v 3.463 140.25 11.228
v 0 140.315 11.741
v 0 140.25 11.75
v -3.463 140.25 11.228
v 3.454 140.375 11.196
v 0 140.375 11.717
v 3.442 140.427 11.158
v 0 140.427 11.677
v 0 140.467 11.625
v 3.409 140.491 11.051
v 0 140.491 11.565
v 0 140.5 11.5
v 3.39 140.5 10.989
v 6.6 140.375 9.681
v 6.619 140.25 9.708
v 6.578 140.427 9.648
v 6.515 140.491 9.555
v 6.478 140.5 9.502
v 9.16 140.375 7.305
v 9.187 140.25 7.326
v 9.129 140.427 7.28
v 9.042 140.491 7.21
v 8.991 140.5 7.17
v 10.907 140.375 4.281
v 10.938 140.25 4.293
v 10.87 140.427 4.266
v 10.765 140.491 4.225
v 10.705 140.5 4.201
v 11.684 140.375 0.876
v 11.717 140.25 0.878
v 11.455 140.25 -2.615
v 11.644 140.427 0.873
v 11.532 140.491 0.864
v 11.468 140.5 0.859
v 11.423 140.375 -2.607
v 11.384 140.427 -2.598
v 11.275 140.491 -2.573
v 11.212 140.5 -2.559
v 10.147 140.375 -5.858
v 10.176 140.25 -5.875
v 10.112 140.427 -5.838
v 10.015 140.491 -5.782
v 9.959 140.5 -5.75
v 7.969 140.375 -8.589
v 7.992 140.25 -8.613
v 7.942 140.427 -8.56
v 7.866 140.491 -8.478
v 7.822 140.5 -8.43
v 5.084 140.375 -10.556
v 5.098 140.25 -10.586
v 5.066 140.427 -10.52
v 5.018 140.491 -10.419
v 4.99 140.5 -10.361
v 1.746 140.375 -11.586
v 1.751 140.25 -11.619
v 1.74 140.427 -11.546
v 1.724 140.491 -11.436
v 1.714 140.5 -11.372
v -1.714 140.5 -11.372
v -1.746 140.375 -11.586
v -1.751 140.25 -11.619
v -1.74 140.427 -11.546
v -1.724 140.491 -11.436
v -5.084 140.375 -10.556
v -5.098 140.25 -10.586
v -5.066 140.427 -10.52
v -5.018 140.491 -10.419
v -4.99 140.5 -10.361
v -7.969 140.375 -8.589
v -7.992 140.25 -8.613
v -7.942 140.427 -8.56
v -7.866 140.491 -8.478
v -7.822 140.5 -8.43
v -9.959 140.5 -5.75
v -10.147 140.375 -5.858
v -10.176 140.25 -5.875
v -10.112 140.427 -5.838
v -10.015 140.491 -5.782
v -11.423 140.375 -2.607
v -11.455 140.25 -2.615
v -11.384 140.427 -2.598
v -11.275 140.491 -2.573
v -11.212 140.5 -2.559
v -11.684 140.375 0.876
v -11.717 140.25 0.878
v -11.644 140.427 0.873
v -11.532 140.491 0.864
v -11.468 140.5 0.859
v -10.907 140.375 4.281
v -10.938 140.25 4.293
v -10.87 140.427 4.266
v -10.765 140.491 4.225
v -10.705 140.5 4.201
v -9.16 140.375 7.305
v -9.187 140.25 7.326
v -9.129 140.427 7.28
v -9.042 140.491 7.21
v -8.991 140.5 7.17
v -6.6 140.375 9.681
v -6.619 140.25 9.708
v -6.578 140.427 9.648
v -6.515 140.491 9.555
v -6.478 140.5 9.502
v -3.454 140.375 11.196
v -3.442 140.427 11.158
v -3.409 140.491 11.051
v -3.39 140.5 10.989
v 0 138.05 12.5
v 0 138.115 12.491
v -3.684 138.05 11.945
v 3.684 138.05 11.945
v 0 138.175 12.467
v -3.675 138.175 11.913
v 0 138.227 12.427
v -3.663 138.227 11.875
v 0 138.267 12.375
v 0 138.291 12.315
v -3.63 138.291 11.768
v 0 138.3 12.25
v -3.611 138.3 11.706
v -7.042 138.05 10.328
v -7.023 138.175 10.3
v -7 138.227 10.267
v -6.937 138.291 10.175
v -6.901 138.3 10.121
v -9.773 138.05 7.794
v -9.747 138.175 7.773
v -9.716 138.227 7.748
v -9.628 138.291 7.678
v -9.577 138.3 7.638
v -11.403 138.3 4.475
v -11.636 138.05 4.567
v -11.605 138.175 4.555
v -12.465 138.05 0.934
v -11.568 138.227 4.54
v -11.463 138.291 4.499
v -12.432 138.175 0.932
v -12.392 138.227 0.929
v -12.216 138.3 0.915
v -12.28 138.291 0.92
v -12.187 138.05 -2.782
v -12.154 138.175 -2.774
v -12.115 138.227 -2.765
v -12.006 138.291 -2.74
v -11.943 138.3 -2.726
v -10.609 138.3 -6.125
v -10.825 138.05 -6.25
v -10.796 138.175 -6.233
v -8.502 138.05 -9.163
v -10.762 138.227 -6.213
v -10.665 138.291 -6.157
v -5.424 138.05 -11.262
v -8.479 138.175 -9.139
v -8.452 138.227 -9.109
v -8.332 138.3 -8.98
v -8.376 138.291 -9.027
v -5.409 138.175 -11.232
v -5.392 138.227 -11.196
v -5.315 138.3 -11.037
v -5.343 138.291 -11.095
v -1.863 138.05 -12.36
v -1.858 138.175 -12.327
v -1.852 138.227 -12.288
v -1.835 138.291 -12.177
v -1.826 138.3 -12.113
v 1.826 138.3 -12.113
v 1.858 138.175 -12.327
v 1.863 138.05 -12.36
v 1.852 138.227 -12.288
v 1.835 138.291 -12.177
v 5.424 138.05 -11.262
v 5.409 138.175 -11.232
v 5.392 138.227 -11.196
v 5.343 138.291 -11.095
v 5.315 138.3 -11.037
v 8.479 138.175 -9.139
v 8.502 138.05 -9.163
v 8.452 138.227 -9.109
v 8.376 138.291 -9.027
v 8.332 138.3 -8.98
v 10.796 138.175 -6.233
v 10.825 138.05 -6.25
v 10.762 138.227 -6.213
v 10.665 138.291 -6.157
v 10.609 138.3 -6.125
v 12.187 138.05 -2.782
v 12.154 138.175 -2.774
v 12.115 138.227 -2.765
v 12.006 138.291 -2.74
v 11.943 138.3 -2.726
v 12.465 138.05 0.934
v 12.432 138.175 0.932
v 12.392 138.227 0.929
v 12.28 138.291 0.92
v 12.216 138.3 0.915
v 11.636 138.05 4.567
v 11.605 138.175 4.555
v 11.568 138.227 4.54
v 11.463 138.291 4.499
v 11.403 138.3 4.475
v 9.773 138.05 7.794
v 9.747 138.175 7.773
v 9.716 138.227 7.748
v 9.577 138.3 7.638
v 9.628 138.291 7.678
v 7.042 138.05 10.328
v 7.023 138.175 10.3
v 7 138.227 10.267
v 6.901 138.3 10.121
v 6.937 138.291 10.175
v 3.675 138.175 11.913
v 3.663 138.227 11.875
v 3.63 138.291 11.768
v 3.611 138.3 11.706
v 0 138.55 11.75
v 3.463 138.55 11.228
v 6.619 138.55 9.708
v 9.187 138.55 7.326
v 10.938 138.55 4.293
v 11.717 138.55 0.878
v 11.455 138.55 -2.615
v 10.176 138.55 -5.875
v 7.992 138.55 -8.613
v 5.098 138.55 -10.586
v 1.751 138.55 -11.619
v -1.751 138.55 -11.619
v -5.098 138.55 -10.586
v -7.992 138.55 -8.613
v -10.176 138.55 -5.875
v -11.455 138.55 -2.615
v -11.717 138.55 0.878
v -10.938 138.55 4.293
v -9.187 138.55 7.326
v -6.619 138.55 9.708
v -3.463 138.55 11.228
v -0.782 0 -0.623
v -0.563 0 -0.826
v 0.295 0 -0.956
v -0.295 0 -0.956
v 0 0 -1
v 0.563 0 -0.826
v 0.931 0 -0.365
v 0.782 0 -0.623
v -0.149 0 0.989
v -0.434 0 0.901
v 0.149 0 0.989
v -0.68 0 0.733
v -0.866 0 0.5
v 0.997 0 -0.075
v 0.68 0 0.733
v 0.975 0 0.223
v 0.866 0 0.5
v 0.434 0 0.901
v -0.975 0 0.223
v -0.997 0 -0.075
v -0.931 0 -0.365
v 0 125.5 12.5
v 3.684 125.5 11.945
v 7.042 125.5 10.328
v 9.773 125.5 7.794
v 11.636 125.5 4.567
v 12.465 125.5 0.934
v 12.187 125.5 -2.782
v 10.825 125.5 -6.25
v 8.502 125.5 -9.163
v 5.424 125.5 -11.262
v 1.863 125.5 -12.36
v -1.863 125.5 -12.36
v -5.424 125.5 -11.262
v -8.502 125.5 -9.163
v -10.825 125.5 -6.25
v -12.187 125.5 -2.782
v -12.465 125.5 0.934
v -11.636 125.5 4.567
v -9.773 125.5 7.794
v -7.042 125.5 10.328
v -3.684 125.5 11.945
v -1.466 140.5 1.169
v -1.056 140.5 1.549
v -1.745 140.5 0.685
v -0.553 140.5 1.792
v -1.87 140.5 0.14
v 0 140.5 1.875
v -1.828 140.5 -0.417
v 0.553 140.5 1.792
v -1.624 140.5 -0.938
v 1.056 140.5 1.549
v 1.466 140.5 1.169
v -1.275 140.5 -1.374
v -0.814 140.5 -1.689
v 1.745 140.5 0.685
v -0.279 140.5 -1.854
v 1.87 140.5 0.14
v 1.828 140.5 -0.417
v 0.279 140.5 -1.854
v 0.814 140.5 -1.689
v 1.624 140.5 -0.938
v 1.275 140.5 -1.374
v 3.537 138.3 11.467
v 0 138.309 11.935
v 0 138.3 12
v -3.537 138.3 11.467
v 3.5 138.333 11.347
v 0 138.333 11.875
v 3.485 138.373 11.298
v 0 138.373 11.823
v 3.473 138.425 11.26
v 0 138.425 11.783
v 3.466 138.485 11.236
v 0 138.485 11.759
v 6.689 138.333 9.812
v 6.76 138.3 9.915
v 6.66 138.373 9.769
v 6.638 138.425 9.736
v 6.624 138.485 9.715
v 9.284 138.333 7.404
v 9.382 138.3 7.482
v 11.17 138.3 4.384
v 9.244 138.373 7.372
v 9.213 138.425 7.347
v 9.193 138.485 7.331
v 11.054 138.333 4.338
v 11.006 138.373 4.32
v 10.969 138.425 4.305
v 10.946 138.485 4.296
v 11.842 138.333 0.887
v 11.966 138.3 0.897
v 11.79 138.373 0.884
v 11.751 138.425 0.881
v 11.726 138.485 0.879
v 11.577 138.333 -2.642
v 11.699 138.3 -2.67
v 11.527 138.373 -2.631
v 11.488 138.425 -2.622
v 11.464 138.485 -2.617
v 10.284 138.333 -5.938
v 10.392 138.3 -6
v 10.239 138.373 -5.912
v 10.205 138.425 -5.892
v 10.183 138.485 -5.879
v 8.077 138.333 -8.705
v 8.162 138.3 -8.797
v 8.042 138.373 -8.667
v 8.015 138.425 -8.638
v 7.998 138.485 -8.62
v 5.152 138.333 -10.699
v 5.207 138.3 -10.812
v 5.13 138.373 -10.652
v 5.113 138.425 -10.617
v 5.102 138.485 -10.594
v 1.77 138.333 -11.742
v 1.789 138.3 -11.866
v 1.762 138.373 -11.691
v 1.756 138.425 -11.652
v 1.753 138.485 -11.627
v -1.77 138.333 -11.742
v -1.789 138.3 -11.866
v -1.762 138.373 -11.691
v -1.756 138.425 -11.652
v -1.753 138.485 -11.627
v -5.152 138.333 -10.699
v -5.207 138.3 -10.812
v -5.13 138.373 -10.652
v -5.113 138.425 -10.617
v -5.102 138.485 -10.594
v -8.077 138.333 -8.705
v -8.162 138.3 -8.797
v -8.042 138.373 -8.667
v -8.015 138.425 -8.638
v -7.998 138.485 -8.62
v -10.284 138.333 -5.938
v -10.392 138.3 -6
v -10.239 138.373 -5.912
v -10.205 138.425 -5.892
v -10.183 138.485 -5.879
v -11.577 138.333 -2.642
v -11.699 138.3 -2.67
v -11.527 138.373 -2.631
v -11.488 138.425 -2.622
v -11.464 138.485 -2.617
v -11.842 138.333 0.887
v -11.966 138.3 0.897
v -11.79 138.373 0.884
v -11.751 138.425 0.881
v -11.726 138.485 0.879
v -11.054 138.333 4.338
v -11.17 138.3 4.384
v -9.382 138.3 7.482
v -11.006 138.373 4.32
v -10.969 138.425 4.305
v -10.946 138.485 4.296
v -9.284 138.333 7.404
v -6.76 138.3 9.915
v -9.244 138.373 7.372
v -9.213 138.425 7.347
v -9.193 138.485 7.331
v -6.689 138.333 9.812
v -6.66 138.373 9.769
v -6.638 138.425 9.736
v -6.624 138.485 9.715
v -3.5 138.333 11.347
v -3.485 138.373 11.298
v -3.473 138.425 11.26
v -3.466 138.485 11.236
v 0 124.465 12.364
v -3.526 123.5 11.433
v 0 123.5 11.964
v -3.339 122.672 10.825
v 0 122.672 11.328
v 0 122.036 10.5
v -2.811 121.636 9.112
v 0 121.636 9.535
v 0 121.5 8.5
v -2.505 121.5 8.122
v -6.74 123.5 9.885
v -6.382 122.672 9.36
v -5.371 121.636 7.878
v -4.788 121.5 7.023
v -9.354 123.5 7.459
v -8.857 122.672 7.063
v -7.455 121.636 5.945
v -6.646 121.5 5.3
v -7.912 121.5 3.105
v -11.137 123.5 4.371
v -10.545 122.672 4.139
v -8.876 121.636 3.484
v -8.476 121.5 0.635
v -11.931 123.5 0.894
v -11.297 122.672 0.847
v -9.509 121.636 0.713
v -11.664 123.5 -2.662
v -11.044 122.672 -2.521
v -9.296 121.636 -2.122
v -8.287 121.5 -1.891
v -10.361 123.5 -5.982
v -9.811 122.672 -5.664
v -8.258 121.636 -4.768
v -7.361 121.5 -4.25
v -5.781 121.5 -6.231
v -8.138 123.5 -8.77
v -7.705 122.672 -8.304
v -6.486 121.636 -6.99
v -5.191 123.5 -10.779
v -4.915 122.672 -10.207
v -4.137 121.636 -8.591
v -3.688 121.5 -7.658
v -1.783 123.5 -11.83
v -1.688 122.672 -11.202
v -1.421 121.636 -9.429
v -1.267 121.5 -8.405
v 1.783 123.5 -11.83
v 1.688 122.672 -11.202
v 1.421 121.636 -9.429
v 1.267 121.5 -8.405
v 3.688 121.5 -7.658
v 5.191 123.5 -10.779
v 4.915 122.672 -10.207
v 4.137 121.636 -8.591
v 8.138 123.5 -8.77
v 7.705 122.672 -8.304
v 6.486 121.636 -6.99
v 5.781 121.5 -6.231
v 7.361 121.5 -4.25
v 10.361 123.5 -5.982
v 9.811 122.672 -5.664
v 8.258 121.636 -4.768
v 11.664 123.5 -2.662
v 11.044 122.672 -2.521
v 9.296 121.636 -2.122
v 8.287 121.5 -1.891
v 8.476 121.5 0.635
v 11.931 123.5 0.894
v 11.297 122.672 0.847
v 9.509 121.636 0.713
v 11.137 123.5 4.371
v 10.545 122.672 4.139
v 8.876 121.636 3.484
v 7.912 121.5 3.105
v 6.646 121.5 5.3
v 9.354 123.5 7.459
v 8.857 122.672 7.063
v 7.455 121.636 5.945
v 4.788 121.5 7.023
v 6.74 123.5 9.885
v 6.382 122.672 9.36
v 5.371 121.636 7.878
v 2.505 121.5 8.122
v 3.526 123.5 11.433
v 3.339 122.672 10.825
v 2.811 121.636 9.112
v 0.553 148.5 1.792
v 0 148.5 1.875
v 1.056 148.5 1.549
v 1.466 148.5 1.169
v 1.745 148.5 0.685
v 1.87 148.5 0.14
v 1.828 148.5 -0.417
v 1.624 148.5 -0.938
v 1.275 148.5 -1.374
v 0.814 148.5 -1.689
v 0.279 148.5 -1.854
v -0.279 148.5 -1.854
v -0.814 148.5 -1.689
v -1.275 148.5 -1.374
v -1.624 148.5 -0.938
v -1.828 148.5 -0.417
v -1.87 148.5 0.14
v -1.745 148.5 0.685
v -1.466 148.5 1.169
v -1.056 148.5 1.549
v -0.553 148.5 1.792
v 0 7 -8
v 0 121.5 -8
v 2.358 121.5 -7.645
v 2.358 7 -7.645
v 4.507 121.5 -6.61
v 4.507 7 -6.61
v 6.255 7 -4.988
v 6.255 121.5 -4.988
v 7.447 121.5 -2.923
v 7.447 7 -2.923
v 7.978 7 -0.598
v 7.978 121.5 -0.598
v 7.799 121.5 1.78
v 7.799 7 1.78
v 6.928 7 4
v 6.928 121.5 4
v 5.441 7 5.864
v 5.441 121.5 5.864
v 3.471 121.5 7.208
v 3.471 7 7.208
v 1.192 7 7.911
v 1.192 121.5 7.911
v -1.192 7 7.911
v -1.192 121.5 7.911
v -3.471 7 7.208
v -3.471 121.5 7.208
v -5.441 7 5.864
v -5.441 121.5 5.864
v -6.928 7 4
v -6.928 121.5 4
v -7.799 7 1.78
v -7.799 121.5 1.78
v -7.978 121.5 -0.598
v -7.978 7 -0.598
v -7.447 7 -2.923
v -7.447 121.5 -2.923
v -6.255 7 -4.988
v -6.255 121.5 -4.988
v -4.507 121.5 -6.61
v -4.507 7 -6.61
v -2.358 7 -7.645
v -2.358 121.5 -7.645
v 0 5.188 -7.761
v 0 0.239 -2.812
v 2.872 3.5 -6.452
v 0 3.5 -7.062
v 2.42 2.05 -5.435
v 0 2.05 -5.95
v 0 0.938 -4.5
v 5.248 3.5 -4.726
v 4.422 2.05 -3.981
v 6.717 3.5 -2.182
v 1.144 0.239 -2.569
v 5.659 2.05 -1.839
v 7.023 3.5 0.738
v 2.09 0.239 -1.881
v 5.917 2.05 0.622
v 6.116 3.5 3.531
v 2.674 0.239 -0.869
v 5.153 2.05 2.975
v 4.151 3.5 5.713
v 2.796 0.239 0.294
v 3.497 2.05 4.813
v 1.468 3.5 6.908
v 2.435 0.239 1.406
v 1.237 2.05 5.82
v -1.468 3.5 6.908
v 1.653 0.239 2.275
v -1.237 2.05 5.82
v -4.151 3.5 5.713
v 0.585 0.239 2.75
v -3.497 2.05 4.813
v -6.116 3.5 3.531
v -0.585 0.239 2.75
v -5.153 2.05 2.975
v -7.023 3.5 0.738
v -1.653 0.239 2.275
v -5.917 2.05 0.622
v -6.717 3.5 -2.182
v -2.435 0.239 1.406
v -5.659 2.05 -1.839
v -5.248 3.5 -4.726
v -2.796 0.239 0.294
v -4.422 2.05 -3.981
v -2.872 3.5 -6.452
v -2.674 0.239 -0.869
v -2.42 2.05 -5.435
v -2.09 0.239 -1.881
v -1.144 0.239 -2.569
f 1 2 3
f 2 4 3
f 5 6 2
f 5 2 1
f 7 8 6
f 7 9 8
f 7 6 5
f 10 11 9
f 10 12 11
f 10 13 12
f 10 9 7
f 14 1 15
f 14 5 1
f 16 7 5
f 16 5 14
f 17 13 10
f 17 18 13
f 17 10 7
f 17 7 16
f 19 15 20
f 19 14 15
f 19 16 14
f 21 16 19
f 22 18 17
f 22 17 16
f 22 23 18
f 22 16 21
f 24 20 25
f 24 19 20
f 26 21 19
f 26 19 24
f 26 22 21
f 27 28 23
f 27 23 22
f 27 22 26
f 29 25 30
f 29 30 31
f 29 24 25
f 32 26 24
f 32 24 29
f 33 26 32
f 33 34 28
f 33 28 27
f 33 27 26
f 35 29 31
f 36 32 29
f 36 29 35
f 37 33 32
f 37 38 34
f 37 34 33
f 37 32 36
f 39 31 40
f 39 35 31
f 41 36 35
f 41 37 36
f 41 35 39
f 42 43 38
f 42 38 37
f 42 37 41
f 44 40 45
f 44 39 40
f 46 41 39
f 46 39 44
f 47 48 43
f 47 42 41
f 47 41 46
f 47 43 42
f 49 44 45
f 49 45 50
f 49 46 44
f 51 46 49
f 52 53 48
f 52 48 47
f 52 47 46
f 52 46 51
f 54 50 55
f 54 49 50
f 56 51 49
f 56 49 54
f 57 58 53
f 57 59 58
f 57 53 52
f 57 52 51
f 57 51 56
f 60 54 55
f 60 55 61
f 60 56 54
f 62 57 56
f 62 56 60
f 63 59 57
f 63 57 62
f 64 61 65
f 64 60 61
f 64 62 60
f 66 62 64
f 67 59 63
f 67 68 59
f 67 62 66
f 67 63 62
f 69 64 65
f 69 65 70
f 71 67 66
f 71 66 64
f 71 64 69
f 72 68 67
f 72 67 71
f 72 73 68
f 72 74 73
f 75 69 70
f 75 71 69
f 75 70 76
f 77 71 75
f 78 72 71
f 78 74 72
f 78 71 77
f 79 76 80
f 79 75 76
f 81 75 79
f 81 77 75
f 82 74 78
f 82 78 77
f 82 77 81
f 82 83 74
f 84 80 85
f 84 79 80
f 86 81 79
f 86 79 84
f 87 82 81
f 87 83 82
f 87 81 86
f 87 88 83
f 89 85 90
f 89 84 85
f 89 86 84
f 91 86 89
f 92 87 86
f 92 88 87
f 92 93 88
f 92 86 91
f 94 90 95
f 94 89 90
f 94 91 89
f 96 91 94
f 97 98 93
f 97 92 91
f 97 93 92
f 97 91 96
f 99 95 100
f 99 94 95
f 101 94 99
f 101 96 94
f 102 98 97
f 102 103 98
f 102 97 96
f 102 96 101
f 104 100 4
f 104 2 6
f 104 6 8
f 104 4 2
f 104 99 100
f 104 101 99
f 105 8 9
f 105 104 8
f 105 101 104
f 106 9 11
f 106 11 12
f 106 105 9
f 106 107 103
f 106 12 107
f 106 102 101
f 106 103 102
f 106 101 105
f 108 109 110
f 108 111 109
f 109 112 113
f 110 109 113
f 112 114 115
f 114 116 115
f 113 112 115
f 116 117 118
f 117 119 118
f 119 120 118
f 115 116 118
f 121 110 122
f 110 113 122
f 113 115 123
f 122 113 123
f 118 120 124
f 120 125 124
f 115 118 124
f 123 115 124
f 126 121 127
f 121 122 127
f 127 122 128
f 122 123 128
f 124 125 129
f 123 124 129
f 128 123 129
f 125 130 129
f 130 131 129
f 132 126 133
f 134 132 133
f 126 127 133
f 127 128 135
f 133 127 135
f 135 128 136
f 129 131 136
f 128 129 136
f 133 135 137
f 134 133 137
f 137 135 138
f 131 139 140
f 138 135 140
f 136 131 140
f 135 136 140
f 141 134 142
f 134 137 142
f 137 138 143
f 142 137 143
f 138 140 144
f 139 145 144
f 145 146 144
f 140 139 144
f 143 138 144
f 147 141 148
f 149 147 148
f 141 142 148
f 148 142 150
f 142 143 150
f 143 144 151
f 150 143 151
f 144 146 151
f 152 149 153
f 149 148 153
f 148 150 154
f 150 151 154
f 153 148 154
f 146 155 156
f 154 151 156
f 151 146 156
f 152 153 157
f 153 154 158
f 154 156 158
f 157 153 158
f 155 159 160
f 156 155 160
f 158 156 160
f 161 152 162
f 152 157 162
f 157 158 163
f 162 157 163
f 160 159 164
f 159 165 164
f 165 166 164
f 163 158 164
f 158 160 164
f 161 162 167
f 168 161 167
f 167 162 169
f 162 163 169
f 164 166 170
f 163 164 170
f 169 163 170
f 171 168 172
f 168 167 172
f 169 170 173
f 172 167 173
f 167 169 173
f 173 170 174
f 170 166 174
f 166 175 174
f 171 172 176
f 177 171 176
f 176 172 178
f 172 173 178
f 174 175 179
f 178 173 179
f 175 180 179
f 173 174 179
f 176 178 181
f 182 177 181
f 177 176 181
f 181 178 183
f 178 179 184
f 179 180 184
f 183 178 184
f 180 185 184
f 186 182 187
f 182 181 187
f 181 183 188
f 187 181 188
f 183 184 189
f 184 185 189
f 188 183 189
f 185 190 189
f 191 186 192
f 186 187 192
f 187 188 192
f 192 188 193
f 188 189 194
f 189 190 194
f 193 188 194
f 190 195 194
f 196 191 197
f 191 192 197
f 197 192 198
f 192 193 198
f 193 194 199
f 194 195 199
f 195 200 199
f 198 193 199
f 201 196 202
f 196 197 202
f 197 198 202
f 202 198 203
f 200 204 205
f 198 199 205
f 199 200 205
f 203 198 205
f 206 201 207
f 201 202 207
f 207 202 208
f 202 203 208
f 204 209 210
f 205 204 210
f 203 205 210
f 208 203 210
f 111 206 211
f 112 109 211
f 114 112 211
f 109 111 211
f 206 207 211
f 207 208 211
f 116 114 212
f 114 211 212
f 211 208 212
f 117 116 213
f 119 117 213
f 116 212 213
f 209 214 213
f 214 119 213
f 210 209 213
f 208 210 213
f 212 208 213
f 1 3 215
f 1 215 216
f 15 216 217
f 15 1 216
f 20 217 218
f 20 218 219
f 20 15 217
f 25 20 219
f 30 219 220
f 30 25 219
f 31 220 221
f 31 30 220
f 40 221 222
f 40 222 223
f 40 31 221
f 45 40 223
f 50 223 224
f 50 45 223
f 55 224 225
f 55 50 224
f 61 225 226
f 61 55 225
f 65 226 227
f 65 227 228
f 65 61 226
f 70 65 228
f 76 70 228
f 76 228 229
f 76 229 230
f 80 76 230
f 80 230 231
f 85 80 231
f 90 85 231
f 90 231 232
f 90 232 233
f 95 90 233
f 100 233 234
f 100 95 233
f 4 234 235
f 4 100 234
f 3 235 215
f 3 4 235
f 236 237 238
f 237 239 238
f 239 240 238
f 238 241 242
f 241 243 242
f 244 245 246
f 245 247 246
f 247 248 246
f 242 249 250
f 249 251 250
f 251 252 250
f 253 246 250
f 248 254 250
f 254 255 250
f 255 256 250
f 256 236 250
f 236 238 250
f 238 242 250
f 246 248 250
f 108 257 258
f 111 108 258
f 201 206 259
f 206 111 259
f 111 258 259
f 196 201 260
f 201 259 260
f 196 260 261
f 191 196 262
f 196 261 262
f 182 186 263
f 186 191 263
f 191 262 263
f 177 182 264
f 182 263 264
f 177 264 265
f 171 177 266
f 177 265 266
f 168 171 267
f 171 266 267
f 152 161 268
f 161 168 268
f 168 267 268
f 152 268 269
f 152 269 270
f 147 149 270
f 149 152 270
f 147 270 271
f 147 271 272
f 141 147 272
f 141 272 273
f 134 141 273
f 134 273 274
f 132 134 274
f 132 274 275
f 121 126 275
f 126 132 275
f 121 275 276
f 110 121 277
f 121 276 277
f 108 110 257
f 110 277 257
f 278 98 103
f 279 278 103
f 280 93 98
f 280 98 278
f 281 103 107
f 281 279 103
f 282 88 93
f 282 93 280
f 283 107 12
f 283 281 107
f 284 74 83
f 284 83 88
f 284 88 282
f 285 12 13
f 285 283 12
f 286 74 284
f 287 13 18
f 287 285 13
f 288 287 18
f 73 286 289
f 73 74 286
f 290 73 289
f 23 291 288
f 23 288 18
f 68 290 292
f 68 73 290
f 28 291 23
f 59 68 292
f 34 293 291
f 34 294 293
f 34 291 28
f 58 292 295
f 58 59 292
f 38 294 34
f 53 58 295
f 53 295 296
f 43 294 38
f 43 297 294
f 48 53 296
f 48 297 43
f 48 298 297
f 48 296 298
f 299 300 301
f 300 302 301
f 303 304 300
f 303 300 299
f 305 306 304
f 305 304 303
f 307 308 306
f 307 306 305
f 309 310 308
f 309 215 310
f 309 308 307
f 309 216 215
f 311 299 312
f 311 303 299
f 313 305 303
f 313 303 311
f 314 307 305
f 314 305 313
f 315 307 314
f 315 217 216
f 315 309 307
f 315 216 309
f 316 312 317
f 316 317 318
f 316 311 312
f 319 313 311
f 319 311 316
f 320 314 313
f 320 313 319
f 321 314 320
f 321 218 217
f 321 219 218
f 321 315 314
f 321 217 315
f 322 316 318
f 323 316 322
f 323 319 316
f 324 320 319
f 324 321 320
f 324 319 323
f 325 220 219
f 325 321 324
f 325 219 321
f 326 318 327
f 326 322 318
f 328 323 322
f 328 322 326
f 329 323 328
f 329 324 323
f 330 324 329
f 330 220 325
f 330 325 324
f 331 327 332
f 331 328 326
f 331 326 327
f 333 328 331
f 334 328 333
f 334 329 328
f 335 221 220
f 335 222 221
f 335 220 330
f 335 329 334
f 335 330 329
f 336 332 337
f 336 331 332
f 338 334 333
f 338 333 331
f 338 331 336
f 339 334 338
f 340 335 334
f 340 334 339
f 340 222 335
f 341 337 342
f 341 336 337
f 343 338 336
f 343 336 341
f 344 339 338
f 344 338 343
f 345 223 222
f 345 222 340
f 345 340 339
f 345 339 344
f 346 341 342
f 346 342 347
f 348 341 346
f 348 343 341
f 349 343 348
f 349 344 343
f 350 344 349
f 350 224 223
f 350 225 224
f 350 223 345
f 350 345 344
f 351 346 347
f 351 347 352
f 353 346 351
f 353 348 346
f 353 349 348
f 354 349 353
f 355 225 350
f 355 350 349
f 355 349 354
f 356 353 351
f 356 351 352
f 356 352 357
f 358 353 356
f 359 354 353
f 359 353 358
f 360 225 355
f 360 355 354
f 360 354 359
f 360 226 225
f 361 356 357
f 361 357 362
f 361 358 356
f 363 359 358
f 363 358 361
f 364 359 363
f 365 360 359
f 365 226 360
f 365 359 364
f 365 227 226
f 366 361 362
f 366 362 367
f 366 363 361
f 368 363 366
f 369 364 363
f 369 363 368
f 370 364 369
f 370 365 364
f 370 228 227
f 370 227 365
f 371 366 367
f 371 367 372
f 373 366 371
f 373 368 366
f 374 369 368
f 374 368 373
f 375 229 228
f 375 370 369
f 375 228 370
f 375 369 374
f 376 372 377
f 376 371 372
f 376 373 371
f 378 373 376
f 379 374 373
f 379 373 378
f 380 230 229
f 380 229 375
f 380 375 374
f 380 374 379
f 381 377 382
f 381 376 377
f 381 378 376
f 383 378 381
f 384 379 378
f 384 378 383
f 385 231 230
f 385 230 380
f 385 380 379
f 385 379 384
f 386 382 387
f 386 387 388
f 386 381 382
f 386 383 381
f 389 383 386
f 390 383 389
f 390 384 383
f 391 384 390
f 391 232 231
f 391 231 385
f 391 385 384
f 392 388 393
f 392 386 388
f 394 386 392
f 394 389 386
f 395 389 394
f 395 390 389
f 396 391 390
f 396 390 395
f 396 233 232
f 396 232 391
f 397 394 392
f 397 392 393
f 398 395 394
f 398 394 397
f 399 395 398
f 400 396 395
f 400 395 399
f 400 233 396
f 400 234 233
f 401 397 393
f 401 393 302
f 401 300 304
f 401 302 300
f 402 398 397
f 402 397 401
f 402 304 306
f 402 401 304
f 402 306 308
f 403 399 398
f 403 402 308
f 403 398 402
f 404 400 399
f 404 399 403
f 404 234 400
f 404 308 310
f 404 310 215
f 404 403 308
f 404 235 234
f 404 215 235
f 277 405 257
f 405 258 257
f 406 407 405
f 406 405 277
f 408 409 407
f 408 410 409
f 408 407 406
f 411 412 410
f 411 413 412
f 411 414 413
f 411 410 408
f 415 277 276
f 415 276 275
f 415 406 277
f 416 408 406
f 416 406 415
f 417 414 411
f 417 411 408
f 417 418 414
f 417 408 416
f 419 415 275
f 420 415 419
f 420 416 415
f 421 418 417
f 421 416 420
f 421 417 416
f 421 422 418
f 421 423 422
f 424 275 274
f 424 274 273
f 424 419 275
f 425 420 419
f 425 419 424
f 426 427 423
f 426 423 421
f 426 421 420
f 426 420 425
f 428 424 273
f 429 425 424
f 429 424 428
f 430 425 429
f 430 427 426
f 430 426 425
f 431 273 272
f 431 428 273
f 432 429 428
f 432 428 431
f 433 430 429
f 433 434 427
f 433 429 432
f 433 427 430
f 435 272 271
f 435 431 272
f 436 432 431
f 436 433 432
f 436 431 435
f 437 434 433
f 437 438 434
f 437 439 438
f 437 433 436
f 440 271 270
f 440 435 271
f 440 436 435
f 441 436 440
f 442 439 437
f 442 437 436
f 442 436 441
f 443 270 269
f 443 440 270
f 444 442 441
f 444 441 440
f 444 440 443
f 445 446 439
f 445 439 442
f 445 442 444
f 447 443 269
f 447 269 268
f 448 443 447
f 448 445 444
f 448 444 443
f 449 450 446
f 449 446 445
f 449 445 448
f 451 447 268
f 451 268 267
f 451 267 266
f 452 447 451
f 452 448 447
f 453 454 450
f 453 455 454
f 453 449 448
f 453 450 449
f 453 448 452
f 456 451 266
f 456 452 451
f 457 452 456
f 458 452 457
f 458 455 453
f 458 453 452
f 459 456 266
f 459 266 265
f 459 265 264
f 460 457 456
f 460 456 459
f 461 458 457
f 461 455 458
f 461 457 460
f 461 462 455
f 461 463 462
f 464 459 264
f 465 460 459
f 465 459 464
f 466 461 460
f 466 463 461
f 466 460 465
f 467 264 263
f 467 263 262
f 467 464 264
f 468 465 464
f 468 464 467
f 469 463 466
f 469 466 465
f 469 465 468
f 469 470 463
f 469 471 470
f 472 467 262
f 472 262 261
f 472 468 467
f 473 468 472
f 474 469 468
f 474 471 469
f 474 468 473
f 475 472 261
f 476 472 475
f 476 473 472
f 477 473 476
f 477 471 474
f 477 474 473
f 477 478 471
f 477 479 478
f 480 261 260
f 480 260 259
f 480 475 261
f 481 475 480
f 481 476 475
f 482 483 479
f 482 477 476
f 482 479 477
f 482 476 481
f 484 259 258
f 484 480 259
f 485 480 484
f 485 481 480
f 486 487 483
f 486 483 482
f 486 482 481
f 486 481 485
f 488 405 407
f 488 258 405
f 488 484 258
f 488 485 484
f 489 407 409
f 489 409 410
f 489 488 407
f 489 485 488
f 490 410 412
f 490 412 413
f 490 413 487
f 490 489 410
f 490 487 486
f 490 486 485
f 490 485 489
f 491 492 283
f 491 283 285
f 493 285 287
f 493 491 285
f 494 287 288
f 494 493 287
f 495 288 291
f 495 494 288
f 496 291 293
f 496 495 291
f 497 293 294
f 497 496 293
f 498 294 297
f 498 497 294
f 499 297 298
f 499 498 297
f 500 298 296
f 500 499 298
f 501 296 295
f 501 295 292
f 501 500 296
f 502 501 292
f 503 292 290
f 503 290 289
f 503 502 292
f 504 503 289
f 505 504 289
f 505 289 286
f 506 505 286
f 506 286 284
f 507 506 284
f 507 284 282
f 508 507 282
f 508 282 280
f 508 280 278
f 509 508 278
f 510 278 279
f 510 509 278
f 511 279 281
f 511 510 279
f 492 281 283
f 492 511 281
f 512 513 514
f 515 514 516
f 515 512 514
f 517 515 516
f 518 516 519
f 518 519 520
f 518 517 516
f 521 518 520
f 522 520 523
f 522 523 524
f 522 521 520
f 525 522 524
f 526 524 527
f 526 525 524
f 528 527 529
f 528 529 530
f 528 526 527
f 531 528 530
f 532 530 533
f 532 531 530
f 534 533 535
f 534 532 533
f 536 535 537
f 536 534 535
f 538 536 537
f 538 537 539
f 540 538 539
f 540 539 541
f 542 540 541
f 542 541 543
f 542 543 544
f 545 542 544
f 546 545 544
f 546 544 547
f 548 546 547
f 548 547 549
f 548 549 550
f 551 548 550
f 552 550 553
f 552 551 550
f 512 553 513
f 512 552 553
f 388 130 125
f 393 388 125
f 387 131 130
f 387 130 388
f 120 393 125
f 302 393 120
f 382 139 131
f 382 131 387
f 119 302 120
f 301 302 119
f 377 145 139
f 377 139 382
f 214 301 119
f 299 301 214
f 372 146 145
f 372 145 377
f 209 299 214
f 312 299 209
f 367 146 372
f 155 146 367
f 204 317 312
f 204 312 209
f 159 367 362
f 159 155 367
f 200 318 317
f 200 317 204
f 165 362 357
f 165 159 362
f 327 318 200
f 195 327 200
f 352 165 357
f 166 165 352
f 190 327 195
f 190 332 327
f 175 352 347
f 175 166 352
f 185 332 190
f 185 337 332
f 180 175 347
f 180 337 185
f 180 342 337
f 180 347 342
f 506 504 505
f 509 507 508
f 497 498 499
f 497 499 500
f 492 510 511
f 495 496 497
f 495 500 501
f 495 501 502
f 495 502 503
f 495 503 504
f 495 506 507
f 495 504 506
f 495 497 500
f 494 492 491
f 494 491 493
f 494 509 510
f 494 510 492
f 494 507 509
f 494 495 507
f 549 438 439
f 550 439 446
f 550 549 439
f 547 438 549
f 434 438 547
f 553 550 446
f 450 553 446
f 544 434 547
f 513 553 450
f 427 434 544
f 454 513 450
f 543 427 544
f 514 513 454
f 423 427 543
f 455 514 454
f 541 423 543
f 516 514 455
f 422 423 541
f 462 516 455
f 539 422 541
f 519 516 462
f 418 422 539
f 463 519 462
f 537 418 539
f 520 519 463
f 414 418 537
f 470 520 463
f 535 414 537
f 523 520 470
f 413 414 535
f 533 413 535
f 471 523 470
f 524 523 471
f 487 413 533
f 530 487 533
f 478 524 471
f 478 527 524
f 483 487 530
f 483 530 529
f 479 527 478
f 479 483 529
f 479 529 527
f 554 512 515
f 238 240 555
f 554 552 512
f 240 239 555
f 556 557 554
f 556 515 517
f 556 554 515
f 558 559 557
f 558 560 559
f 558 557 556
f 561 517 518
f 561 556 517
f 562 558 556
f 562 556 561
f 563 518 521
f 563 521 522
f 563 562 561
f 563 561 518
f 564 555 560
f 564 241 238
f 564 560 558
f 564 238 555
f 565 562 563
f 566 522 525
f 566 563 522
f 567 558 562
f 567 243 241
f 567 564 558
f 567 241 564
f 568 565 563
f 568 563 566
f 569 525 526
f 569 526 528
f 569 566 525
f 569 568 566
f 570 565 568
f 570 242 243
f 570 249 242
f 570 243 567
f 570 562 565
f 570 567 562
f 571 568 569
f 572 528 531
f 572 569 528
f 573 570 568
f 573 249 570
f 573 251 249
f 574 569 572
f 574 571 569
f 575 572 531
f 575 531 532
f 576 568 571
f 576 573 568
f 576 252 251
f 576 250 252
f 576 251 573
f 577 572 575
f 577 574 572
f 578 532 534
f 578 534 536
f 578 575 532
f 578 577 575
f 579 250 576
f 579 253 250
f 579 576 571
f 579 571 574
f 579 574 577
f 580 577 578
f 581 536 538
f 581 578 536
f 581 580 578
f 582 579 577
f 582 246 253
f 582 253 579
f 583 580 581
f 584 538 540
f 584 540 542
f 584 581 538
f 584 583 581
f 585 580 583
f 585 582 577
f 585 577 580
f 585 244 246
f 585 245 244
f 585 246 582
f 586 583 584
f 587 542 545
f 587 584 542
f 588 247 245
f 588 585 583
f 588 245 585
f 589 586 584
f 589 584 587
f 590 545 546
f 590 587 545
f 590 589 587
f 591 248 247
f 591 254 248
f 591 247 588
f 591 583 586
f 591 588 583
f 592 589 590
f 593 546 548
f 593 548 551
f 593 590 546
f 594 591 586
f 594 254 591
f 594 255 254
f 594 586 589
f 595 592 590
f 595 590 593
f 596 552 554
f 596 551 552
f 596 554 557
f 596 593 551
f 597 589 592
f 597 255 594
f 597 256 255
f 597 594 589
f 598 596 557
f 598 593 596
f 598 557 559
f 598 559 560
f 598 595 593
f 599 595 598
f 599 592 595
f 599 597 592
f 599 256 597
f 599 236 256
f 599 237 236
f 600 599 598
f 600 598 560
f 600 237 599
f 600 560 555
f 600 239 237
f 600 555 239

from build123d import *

# Parameters (mm, degrees)
SKETCH1_R           = 12.5
BOSS_EXTRUDE1_DEPTH = 148.5
SKETCH2_OUTSIDE_W   = 57.53
SKETCH2_OUTSIDE_H   = 57.53
SKETCH2_OUTSIDE_R   = 8
CUT_EXTRUDE1_DEPTH  = 121.5
SKETCH3_OUTSIDE_W   = 57.53
SKETCH3_OUTSIDE_H   = 57.53
SKETCH3_OUTSIDE_R   = 1.875
CUT_EXTRUDE2_DEPTH  = 8
FILLET1_R           = 4
FILLET2_R           = 7
SKETCH6_OUTSIDE_W   = 57.53
SKETCH6_OUTSIDE_H   = 57.53
SKETCH6_OUTSIDE_R   = 11.75
CUT_EXTRUDE3_DEPTH  = 2.2
FILLET3_R           = 0.25


with BuildPart() as part:
    # Sketch1 → Boss-Extrude1 (new body)
    with BuildSketch(Plane(origin=(0, 0, 0), x_dir=(1, 0, 0), z_dir=(0, 1, 0))):
        with Locations(Location((0, 0, 0), (0, 0, 270))):
            Circle(SKETCH1_R)
    extrude(amount=BOSS_EXTRUDE1_DEPTH)

    # Sketch2 outside → Cut-Extrude1 (cut)
    with BuildSketch(Plane.XZ):
        Rectangle(SKETCH2_OUTSIDE_W, SKETCH2_OUTSIDE_H)
        with Locations(Location((0, 0, 0), (0, 0, 270))):
            Circle(SKETCH2_OUTSIDE_R, mode=Mode.SUBTRACT)
    extrude(amount=-CUT_EXTRUDE1_DEPTH, mode=Mode.SUBTRACT)

    # Sketch3 outside → Cut-Extrude2 (cut)
    with BuildSketch(Plane(origin=(0, 148.5, 0), x_dir=(1, 0, 0), z_dir=(0, 1, 0))):
        Rectangle(SKETCH3_OUTSIDE_W, SKETCH3_OUTSIDE_H)
        with Locations(Location((0, 0, 0), (0, 0, 270))):
            Circle(SKETCH3_OUTSIDE_R, mode=Mode.SUBTRACT)
    extrude(amount=-CUT_EXTRUDE2_DEPTH, mode=Mode.SUBTRACT)

    # Fillet1
    fillet1_edges = [part.edges().sort_by_distance(p)[0] for p in [
        (0, 121.5, -12.5),
    ]]
    fillet(fillet1_edges, radius=FILLET1_R)

    # Fillet2
    fillet2_edges = [part.edges().sort_by_distance(p)[0] for p in [
        (0, 0, 8),
    ]]
    fillet(fillet2_edges, radius=FILLET2_R)

    # Sketch6 outside → Cut-Extrude3 (cut)
    with BuildSketch(Plane(origin=(0, 140.5, 0), x_dir=(1, 0, 0), z_dir=(0, 1, 0))):
        Rectangle(SKETCH6_OUTSIDE_W, SKETCH6_OUTSIDE_H)
        with Locations(Location((0, 0, 0), (0, 0, 270))):
            Circle(SKETCH6_OUTSIDE_R, mode=Mode.SUBTRACT)
    extrude(amount=-CUT_EXTRUDE3_DEPTH, mode=Mode.SUBTRACT)

    # Fillet3
    fillet3_edges = [part.edges().sort_by_distance(p)[0] for p in [
        (0, 138.3, -11.75),
        (0, 138.3, -12.5),
        (0, 140.5, -11.75),
    ]]
    fillet(fillet3_edges, radius=FILLET3_R)


solid = part.part
